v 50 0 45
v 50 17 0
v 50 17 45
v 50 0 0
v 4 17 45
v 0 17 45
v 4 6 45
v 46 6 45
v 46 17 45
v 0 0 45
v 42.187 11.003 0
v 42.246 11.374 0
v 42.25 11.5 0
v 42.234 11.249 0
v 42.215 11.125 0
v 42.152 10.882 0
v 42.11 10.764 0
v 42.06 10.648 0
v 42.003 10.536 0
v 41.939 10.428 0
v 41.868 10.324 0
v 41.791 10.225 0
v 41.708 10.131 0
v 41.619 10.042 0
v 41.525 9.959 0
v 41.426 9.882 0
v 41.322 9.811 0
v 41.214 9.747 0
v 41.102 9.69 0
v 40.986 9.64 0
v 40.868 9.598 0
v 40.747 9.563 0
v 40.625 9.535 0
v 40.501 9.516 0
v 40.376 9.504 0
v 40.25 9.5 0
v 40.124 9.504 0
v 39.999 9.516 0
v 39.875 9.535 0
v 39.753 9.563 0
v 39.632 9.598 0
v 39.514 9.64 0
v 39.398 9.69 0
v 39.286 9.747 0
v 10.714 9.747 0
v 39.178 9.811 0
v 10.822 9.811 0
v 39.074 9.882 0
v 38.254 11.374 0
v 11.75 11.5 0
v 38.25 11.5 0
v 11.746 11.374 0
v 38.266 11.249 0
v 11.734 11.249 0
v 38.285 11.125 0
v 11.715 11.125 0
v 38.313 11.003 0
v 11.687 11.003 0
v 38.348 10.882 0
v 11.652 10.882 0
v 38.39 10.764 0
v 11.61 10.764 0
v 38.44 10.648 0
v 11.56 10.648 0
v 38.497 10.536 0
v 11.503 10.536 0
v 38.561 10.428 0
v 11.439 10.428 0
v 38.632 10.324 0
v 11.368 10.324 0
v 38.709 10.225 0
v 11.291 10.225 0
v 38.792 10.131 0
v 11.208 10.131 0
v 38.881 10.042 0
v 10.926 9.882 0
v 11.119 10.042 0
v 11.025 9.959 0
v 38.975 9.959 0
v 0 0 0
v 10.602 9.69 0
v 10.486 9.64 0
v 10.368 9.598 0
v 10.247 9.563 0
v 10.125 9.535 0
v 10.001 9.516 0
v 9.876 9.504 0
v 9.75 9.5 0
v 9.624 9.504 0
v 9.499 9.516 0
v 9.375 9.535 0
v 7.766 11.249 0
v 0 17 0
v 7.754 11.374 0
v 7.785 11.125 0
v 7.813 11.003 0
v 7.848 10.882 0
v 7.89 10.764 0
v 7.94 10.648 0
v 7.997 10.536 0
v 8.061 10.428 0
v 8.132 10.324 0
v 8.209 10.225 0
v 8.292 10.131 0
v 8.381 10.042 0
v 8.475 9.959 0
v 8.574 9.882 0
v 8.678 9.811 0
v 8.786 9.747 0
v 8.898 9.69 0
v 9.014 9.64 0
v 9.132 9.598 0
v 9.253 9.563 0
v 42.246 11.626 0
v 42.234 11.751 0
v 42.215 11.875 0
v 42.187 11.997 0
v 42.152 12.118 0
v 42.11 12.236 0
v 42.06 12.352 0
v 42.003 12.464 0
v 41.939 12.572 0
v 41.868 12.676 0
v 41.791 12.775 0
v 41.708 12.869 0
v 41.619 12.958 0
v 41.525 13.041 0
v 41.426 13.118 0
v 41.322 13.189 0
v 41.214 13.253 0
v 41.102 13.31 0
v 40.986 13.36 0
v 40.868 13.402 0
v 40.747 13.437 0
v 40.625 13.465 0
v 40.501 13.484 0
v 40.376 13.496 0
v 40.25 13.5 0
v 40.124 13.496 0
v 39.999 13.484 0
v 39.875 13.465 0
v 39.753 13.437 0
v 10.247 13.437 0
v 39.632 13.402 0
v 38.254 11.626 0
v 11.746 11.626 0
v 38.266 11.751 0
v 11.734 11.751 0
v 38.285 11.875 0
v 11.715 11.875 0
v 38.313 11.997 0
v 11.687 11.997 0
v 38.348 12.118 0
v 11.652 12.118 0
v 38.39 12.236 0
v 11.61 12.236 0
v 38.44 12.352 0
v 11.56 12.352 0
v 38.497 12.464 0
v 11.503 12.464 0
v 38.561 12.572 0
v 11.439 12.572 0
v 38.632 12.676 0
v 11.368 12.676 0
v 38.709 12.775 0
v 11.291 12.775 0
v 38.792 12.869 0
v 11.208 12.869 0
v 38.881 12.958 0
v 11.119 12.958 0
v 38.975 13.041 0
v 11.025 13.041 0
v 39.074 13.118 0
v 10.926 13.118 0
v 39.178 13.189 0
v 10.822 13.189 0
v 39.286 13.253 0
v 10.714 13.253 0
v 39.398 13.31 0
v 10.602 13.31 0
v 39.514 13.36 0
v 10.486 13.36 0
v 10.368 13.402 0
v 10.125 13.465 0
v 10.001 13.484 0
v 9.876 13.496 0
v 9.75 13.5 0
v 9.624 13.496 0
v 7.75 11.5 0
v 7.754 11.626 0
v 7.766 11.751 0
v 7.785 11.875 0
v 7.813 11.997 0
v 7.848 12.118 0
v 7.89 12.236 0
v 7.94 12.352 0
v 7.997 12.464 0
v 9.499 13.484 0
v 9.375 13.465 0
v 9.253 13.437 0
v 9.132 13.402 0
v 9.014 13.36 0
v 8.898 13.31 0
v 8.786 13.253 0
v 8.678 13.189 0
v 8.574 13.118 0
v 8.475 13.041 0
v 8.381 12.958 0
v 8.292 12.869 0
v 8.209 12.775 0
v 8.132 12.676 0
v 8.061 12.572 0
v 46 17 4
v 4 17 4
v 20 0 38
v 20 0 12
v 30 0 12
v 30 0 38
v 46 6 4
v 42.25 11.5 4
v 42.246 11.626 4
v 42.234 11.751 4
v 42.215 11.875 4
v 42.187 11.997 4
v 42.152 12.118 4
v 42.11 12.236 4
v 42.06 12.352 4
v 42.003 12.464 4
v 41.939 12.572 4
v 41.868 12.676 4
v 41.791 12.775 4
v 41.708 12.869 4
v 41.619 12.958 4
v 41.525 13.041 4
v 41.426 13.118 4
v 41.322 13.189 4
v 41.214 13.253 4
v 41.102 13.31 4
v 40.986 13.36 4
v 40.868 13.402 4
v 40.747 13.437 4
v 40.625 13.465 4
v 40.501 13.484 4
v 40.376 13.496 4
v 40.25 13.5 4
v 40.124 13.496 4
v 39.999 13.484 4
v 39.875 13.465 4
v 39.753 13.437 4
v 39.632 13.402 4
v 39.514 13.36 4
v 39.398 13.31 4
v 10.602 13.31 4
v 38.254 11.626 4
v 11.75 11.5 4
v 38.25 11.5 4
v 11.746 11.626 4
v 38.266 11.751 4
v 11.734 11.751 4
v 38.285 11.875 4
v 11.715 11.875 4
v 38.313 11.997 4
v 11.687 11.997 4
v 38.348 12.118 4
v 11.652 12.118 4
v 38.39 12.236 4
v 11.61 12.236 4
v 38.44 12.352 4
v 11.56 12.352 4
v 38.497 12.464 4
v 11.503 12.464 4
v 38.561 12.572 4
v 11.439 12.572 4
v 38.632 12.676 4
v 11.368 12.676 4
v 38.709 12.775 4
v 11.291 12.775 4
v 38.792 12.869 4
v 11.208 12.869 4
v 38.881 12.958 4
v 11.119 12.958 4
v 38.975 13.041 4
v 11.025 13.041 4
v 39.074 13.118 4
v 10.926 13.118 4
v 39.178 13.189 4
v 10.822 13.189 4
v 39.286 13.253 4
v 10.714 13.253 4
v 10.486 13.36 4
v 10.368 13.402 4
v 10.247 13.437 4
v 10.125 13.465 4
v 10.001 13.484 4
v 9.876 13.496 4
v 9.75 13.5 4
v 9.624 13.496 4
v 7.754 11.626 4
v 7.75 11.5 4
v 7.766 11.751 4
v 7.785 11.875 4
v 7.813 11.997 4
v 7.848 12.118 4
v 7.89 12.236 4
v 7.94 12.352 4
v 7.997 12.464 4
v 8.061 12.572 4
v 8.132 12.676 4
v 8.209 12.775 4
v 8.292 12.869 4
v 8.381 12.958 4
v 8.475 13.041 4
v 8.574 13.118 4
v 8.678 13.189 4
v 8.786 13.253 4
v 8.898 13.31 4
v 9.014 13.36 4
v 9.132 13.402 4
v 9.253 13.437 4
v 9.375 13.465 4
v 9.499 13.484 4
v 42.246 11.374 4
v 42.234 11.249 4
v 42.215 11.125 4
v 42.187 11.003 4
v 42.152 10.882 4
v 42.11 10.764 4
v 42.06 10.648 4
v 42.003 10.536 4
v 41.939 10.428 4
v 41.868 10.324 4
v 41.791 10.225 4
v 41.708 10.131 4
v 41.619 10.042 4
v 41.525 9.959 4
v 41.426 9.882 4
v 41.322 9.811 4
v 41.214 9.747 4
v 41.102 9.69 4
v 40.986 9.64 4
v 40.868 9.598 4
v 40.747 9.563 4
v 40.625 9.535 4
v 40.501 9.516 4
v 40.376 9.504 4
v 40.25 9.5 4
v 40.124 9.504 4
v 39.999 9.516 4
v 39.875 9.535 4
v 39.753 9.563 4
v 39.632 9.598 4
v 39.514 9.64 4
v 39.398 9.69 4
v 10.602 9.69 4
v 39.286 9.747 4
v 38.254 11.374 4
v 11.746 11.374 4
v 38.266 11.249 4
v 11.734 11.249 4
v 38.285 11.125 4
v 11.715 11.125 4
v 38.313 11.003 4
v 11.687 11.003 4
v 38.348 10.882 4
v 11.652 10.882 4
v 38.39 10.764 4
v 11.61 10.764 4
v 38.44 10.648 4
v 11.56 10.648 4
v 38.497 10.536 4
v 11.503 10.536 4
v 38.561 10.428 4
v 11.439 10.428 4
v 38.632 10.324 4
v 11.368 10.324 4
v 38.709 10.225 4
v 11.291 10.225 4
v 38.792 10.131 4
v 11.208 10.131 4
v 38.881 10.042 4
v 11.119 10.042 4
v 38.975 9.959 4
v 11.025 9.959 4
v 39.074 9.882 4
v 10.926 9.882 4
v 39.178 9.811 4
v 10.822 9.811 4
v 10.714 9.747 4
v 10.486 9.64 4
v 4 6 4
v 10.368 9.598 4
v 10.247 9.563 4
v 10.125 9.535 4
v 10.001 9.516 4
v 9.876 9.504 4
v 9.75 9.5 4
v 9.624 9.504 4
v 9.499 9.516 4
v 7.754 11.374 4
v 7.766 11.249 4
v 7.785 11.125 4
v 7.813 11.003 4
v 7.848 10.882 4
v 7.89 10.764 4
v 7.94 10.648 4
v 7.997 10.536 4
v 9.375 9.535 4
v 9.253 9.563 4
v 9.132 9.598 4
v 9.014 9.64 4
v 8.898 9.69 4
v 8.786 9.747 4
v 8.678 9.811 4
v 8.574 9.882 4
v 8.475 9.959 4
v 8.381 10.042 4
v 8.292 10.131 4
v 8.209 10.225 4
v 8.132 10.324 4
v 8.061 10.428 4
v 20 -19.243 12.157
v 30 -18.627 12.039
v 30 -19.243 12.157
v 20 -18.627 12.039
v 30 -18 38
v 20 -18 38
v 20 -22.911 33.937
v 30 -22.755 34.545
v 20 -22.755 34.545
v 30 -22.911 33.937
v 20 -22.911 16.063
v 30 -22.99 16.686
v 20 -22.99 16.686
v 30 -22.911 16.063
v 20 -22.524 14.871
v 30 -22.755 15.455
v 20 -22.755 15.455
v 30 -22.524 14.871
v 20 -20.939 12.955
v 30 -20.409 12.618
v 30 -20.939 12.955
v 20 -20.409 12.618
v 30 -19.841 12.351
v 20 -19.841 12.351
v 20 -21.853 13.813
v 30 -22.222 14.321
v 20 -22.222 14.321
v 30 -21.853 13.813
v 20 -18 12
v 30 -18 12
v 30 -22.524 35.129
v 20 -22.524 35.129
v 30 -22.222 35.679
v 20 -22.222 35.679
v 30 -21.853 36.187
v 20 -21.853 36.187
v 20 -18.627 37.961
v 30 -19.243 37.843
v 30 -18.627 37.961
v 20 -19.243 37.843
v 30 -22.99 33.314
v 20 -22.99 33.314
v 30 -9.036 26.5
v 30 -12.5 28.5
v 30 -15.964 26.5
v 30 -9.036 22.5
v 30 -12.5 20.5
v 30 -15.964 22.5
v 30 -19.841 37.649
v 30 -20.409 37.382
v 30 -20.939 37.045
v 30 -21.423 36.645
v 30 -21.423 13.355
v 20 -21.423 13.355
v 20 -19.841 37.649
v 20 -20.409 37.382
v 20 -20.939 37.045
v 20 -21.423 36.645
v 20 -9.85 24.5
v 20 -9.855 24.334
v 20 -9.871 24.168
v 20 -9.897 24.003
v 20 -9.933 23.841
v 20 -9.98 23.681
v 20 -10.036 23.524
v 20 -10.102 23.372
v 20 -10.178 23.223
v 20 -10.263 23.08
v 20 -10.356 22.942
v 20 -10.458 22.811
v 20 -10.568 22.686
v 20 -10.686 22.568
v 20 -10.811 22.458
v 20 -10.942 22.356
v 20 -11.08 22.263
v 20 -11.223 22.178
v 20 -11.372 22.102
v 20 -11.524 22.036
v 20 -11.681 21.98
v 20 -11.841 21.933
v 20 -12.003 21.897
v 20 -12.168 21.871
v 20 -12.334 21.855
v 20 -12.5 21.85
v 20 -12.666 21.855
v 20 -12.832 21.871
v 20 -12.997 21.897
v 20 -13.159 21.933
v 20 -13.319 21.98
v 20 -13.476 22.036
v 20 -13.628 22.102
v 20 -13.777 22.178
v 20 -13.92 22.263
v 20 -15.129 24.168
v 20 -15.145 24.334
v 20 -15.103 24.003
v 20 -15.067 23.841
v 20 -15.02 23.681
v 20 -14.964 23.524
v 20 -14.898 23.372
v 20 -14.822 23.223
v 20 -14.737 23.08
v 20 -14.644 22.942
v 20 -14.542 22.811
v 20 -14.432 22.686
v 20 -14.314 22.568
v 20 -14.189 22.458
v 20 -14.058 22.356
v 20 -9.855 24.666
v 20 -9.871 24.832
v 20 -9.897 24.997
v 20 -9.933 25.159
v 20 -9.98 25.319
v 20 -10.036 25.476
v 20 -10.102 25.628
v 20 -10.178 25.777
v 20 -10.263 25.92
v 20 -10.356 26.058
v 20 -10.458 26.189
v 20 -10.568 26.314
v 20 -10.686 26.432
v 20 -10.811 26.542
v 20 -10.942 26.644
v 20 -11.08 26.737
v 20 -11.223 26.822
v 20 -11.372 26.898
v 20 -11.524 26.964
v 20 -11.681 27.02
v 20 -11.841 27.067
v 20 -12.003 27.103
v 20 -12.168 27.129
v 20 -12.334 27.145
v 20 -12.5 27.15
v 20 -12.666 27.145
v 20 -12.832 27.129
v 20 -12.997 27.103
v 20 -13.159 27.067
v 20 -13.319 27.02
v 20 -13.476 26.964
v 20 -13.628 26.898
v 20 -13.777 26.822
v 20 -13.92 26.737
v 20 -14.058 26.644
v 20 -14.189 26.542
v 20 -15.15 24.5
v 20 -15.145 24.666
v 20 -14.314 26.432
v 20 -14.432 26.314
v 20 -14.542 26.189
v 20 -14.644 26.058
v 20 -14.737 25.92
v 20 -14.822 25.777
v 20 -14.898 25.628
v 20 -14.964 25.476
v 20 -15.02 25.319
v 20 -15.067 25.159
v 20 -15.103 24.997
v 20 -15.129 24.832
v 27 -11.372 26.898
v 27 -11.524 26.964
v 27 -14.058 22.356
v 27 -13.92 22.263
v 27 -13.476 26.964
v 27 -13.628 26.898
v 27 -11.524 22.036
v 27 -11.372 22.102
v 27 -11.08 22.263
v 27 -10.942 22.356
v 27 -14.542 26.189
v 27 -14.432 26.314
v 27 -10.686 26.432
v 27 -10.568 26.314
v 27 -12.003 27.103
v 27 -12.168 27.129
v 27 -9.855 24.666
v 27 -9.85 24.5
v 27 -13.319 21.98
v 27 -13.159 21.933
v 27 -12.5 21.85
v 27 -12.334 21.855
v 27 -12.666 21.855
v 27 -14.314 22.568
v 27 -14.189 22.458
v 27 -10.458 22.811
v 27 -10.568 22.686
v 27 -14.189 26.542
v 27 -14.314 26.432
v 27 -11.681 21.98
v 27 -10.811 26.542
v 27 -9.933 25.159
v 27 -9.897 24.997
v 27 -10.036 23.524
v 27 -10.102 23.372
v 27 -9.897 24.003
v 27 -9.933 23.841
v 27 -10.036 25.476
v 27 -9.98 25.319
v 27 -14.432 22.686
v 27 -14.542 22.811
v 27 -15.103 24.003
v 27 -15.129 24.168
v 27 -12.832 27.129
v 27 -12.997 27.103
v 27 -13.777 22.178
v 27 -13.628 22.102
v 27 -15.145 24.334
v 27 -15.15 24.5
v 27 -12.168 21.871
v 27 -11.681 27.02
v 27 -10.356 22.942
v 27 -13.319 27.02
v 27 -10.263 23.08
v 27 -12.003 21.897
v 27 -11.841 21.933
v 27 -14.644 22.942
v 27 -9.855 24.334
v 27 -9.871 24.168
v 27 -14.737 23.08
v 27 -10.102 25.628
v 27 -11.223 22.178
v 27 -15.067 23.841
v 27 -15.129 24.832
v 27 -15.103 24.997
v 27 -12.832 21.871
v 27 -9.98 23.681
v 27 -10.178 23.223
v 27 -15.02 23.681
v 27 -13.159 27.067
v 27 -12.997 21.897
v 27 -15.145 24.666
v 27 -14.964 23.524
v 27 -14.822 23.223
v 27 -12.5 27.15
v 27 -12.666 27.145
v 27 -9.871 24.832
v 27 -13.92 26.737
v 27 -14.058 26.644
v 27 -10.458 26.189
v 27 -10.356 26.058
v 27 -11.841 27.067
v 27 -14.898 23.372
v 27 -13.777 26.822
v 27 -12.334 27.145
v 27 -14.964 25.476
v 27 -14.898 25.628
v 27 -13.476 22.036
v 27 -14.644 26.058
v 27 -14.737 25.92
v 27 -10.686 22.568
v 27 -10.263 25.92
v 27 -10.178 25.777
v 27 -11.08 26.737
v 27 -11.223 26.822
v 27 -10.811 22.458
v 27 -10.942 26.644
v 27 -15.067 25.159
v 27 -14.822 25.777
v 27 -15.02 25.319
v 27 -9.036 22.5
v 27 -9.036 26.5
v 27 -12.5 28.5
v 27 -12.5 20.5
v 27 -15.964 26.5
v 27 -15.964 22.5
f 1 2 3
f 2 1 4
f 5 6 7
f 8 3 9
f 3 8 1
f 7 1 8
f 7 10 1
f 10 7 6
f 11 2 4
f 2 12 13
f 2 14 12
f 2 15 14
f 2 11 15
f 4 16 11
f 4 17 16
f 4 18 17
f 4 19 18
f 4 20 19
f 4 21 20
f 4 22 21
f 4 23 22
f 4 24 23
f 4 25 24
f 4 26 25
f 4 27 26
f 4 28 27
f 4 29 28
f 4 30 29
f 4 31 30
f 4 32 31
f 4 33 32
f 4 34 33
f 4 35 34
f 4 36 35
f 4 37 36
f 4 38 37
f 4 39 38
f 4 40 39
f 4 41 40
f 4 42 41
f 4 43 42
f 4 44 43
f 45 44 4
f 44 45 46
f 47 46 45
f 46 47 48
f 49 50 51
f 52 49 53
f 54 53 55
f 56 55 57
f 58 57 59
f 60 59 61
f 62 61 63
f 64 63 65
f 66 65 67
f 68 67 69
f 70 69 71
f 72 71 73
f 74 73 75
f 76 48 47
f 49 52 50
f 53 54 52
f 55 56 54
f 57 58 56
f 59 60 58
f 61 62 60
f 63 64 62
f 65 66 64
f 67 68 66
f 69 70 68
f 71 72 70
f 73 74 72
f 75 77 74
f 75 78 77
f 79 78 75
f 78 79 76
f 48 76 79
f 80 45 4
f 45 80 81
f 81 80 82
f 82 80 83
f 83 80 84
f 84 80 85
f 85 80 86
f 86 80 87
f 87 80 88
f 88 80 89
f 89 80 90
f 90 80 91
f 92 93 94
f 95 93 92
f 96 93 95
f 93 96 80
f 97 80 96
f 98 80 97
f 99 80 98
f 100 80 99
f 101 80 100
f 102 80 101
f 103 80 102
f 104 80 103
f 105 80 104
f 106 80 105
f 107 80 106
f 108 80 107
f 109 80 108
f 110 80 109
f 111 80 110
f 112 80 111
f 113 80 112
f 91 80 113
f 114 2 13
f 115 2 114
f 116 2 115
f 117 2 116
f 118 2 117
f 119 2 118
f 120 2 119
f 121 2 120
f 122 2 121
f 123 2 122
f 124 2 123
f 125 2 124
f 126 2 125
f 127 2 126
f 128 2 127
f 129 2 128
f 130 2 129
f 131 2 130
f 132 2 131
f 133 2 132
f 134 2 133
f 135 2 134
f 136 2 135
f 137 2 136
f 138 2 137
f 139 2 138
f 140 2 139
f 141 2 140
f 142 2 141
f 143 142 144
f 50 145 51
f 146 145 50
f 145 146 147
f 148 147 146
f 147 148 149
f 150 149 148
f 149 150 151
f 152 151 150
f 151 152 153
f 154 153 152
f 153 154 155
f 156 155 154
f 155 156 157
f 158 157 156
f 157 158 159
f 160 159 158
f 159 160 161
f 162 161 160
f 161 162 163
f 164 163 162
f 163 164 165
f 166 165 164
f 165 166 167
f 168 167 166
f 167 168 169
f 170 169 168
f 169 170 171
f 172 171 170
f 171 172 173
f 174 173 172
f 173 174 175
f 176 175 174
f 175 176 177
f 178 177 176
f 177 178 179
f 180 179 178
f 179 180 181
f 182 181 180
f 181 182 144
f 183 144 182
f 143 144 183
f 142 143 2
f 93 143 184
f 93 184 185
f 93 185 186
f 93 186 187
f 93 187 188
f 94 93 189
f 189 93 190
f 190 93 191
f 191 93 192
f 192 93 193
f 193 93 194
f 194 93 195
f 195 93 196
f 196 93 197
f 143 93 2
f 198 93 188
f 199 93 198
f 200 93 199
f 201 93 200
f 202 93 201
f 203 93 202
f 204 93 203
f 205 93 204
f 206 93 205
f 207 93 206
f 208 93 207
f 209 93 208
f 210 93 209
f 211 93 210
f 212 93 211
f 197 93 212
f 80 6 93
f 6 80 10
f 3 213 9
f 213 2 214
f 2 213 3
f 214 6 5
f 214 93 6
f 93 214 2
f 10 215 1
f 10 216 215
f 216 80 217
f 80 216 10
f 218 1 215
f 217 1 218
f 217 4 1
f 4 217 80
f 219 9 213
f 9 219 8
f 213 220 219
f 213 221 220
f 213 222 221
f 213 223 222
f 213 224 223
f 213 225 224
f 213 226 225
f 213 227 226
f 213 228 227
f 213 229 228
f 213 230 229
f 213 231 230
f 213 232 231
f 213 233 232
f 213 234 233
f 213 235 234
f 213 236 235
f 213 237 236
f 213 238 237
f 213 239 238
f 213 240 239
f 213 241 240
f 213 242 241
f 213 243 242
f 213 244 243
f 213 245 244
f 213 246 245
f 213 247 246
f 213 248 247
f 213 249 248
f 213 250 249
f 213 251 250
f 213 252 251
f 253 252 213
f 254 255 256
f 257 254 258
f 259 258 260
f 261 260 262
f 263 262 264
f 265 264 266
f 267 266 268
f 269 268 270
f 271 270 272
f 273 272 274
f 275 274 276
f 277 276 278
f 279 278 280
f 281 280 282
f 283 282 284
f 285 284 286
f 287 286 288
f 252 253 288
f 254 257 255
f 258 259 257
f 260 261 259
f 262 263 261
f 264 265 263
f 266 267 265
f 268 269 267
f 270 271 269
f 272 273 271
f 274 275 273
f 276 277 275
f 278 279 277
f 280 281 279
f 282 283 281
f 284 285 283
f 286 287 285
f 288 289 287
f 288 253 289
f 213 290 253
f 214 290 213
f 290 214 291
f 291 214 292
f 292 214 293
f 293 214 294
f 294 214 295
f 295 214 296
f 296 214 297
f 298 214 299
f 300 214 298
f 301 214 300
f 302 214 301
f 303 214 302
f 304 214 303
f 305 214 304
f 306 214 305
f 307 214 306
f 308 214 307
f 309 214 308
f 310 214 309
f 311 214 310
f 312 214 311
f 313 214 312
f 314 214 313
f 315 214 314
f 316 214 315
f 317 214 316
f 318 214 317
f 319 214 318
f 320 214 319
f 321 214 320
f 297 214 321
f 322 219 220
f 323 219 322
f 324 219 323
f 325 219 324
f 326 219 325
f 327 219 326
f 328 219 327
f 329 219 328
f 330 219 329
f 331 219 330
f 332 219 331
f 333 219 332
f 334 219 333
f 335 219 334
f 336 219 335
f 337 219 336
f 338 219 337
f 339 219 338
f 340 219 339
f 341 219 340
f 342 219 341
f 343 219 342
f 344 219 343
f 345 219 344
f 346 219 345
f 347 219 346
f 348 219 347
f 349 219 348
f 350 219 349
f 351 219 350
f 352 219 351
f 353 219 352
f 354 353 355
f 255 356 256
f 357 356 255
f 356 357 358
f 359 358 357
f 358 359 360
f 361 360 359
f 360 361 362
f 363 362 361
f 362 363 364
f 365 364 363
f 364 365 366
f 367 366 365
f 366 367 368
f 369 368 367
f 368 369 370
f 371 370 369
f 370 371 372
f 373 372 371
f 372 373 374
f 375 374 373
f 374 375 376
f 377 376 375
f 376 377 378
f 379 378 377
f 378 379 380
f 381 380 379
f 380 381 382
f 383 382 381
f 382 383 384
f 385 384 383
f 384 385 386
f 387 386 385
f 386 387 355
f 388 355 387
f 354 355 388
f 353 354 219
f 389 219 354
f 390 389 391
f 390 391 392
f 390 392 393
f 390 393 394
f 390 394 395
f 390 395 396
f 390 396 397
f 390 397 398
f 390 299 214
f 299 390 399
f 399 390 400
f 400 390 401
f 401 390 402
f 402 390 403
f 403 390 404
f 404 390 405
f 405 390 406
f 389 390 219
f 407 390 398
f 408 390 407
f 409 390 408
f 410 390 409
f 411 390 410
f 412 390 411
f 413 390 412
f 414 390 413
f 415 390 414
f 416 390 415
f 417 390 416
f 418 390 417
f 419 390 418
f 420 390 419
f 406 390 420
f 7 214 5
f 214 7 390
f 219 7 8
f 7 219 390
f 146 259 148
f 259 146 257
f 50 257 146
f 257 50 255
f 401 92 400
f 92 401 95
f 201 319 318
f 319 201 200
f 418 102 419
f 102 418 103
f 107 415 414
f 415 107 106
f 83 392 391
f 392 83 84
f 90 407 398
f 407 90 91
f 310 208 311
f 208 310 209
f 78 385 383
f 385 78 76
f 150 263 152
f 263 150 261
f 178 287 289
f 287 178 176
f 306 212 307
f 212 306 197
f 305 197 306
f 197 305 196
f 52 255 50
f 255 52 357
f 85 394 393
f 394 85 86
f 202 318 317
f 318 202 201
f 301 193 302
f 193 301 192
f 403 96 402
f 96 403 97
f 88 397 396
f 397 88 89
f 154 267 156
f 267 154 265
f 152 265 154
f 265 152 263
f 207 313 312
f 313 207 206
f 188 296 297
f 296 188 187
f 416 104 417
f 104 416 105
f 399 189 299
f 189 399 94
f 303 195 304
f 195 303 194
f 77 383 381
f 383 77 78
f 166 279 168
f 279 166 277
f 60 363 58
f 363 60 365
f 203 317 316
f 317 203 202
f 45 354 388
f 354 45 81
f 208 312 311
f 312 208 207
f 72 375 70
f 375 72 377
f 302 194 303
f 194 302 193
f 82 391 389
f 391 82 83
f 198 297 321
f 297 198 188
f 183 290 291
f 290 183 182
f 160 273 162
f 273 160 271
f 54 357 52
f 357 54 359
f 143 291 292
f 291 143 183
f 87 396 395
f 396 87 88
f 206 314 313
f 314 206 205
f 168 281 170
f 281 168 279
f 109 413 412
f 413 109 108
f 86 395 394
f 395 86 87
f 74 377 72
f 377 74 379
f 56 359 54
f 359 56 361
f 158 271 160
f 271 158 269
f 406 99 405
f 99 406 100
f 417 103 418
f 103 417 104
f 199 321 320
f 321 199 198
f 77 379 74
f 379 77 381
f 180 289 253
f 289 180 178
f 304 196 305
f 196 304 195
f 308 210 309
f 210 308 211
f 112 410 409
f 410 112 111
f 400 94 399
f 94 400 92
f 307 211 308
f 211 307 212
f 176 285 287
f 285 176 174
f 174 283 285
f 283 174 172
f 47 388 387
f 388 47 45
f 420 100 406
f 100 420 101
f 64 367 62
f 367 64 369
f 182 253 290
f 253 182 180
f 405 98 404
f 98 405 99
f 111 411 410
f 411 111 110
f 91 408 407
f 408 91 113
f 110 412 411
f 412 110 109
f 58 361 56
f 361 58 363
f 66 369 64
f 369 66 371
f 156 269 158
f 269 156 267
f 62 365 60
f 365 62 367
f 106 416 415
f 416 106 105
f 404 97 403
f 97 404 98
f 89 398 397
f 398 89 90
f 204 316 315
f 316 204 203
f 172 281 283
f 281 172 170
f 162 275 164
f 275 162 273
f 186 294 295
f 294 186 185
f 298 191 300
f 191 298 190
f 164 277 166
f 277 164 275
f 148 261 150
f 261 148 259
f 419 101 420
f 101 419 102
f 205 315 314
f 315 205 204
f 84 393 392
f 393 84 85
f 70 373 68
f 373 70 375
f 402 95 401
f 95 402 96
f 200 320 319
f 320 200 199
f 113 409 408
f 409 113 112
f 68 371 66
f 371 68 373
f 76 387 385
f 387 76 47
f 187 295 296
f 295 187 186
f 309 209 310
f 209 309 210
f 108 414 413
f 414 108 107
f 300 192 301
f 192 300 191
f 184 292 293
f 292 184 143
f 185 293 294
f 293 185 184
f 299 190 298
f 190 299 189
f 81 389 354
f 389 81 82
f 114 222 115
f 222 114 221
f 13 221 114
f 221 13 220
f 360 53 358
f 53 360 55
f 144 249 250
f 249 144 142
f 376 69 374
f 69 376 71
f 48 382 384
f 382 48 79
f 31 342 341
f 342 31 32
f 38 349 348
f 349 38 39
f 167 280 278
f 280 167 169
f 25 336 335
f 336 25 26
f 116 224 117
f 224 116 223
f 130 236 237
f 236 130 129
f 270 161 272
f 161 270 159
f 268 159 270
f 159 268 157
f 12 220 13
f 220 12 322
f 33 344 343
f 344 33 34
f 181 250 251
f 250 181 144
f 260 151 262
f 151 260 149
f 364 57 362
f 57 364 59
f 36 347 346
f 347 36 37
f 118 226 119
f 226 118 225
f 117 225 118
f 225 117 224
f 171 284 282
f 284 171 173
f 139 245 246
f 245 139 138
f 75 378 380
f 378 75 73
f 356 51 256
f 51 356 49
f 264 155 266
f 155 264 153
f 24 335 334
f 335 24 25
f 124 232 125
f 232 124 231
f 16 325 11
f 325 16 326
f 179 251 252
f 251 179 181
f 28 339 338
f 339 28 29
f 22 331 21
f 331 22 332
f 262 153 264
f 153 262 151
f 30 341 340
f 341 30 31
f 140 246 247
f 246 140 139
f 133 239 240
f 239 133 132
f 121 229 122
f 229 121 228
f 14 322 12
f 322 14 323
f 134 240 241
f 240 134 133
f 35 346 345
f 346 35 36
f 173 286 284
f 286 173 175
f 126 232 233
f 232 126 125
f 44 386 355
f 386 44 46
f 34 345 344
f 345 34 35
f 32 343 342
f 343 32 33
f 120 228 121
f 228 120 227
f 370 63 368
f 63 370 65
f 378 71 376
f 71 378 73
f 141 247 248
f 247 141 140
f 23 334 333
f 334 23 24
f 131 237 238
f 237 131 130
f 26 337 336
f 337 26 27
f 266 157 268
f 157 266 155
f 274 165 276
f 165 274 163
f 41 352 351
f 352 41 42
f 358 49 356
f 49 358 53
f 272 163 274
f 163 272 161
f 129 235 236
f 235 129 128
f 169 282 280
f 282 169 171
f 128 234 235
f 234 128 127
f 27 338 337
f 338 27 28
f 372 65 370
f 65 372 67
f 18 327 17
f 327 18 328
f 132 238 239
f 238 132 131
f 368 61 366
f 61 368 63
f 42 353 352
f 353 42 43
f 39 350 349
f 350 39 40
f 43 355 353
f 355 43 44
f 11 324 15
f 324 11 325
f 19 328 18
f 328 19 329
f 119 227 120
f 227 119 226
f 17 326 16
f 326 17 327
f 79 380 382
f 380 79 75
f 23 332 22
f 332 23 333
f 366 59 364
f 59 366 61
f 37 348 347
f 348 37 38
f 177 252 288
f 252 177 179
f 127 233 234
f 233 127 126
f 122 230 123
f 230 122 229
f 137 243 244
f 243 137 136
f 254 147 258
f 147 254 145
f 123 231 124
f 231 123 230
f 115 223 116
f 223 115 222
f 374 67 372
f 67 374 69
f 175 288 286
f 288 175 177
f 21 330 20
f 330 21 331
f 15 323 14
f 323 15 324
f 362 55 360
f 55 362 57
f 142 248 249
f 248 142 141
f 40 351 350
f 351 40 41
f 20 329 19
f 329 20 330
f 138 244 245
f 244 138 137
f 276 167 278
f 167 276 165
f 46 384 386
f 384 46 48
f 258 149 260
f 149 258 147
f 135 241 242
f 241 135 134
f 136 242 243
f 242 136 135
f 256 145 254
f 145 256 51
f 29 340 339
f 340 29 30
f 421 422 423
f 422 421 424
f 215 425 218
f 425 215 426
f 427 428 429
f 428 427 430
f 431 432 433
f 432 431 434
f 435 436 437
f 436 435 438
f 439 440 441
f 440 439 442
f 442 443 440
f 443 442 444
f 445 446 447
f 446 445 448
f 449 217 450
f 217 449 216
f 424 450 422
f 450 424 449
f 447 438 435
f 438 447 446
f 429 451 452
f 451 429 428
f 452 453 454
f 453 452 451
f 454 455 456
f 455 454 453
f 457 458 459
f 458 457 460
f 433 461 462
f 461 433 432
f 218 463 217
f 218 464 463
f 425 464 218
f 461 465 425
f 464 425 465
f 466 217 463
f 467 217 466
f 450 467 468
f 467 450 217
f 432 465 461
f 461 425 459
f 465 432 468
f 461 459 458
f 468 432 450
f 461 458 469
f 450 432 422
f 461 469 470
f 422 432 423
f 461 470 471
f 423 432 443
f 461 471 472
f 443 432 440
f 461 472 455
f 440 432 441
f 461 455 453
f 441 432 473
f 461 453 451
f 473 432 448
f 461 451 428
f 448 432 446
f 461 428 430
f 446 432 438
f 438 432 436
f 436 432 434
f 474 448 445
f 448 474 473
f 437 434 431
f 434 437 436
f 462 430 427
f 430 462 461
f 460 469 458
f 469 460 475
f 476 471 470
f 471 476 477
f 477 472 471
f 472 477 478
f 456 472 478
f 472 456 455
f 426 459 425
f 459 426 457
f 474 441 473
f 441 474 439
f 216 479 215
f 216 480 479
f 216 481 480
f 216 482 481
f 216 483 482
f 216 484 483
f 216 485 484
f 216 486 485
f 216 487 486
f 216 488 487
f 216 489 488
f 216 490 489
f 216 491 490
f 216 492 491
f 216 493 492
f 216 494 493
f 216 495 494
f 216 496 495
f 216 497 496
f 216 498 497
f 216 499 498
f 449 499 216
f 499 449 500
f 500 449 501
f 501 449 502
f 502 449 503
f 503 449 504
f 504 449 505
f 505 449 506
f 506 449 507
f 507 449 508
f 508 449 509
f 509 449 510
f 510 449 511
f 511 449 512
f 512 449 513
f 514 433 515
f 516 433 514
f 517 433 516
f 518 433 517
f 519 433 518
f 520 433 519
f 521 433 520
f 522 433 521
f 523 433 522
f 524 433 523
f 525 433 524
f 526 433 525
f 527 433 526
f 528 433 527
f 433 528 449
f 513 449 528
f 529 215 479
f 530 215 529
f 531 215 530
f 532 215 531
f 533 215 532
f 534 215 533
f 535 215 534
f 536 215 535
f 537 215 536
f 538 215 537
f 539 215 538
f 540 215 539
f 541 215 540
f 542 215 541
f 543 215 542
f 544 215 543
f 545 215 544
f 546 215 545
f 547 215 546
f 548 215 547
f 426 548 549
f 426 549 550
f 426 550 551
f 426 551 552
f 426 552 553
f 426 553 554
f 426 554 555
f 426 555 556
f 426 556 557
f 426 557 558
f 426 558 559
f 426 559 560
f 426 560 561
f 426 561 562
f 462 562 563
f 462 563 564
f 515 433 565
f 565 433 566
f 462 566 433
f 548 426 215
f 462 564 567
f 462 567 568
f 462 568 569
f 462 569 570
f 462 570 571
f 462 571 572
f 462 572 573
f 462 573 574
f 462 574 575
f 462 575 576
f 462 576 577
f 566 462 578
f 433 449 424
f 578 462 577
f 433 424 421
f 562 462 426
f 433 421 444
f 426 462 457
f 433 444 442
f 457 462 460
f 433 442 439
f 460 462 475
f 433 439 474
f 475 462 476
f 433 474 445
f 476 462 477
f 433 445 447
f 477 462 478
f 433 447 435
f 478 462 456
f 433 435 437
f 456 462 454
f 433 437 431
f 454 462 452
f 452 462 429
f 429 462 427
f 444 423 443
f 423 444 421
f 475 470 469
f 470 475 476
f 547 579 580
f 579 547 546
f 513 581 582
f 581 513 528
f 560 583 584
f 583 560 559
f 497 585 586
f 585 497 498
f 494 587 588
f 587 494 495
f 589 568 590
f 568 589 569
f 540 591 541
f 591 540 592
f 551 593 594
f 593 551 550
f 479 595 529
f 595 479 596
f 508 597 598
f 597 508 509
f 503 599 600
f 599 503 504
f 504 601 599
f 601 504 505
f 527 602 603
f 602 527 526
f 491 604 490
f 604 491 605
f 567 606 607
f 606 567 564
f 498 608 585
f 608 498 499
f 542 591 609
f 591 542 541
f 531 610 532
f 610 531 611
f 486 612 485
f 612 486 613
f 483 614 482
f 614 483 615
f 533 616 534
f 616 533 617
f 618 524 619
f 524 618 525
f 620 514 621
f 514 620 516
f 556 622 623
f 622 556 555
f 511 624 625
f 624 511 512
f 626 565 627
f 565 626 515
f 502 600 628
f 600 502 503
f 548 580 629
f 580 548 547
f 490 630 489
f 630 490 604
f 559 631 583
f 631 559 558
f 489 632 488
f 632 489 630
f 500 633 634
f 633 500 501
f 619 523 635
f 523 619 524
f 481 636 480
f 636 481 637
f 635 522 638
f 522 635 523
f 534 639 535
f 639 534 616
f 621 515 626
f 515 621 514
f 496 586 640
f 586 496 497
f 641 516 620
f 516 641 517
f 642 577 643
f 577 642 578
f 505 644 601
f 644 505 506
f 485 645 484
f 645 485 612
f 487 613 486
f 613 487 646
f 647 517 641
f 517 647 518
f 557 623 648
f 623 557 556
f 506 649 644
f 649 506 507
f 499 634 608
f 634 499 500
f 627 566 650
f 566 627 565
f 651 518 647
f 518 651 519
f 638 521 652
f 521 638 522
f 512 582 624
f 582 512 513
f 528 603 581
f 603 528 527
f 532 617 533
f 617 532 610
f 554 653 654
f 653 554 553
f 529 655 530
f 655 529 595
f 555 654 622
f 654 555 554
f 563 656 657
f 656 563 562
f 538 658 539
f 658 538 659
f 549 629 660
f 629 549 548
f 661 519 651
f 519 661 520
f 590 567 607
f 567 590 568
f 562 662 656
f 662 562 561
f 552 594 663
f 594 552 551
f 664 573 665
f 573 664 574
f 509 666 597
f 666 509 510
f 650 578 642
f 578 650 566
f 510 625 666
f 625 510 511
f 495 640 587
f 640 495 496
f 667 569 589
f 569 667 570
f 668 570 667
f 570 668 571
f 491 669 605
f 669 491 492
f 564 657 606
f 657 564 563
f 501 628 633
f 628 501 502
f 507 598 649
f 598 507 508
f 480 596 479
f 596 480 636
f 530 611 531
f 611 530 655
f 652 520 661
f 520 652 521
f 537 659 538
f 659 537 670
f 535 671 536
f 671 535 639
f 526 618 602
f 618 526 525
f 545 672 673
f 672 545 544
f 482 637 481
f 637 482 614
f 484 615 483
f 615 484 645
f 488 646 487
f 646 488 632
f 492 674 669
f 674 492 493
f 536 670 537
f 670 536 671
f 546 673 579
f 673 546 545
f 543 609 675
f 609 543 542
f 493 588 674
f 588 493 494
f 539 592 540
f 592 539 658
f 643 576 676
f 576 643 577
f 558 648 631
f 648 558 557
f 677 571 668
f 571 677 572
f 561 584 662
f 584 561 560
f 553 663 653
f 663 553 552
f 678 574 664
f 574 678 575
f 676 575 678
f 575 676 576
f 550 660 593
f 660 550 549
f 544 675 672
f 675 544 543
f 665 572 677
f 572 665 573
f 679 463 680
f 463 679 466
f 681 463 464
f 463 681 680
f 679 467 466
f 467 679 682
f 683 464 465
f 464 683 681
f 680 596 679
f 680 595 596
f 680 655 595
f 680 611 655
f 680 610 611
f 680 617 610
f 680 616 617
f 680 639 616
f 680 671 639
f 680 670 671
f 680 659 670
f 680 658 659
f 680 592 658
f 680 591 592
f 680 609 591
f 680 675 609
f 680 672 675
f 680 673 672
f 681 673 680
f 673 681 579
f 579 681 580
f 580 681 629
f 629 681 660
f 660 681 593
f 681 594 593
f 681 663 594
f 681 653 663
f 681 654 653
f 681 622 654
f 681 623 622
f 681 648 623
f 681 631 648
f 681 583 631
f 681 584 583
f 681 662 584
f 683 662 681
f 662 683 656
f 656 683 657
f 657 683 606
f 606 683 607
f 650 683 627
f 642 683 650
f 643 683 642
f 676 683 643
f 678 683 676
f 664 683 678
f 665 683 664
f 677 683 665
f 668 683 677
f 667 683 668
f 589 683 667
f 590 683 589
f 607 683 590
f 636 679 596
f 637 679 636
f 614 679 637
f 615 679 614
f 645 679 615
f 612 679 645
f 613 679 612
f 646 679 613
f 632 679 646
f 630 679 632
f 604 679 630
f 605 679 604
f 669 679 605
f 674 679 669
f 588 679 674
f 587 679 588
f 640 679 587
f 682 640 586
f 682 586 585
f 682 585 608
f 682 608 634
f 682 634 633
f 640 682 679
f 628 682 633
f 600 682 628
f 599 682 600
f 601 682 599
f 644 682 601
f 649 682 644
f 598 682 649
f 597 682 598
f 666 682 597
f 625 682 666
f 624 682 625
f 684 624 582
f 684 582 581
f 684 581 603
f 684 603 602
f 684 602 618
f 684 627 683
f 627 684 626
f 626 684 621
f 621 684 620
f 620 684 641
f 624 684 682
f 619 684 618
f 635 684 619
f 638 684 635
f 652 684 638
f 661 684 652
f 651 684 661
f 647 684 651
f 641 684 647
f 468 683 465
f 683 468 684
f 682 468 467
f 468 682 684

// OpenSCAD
union() {
    translate([0,0,0]) {
    difference() {
        cube ([50,17,45], center=false);
        translate([4,6,4])
        cube([42,15,45]);
      translate([9.75,11.5,0])
        cylinder(12,2,2,$fn=100,center=true);
         translate([40.25,11.5,0])
        cylinder(12,2,2,$fn=100,center=true);

    }
}
   translate([20,-18,17]){
difference() 
       {
           $fn=50;
minkowski()
{   cube([5,18,16], center=false);
     rotate([0,90,0])
    cylinder(5,5,5);}
    
    translate([0,5.5,7.5])
    rotate([0,90,0])
    cylinder(8,2.65,2.65,$fn=100, center=false);
        translate([7,5.5,7.5])
    rotate([0,90,0])
    cylinder(5,4,4,$fn=6, center=false);
}
}
}
  
